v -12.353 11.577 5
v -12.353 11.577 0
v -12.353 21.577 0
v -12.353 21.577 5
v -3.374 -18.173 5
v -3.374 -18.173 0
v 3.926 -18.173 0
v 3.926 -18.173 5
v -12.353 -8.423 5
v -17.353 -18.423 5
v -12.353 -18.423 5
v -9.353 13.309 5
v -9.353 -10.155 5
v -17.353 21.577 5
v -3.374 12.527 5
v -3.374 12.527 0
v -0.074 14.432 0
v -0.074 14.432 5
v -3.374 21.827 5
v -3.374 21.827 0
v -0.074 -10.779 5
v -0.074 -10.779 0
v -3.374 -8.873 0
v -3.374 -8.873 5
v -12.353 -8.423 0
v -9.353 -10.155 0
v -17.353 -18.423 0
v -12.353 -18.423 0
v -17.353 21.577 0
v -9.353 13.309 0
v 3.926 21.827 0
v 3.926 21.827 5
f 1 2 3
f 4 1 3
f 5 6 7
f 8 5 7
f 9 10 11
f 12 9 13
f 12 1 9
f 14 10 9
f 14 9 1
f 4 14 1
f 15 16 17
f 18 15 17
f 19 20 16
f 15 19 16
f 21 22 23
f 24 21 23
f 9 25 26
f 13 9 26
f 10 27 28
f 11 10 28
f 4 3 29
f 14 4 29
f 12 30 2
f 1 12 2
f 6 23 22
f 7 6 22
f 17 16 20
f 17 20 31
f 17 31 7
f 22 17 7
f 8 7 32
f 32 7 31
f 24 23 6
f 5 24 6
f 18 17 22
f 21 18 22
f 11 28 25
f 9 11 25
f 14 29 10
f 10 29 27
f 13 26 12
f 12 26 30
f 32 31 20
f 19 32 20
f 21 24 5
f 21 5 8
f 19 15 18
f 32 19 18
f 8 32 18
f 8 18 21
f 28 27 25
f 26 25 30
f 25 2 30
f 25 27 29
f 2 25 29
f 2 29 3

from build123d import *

# Parameters (mm, degrees)
F2_DEPTH = 5


with BuildPart() as f2:
    # F0 (on Top) + F1 (on Top) → F2 (new body)
    with BuildSketch(Plane.XY):
        Polygon((-12.352766, 11.577226), (-12.352766, 21.577226), (-17.352766, 21.577226), (-17.352766, -18.422774), (-12.352766, -18.422774), (-12.352766, -8.422774), align=None)
        Polygon((-9.352766, 13.309276), (-12.352766, 11.577226), (-12.352766, -8.422774), (-9.352766, -10.154825), align=None)
    with BuildSketch(Plane.XY):
        Polygon((3.925666, 21.826735), (-3.374334, 21.826735), (-3.374334, 12.526735), (-0.074334, 14.431991), (-0.074334, -10.778521), (-3.374334, -8.873265), (-3.374334, -18.173265), (3.925666, -18.173265), align=None)
    extrude(amount=F2_DEPTH)


solid = f2.part
